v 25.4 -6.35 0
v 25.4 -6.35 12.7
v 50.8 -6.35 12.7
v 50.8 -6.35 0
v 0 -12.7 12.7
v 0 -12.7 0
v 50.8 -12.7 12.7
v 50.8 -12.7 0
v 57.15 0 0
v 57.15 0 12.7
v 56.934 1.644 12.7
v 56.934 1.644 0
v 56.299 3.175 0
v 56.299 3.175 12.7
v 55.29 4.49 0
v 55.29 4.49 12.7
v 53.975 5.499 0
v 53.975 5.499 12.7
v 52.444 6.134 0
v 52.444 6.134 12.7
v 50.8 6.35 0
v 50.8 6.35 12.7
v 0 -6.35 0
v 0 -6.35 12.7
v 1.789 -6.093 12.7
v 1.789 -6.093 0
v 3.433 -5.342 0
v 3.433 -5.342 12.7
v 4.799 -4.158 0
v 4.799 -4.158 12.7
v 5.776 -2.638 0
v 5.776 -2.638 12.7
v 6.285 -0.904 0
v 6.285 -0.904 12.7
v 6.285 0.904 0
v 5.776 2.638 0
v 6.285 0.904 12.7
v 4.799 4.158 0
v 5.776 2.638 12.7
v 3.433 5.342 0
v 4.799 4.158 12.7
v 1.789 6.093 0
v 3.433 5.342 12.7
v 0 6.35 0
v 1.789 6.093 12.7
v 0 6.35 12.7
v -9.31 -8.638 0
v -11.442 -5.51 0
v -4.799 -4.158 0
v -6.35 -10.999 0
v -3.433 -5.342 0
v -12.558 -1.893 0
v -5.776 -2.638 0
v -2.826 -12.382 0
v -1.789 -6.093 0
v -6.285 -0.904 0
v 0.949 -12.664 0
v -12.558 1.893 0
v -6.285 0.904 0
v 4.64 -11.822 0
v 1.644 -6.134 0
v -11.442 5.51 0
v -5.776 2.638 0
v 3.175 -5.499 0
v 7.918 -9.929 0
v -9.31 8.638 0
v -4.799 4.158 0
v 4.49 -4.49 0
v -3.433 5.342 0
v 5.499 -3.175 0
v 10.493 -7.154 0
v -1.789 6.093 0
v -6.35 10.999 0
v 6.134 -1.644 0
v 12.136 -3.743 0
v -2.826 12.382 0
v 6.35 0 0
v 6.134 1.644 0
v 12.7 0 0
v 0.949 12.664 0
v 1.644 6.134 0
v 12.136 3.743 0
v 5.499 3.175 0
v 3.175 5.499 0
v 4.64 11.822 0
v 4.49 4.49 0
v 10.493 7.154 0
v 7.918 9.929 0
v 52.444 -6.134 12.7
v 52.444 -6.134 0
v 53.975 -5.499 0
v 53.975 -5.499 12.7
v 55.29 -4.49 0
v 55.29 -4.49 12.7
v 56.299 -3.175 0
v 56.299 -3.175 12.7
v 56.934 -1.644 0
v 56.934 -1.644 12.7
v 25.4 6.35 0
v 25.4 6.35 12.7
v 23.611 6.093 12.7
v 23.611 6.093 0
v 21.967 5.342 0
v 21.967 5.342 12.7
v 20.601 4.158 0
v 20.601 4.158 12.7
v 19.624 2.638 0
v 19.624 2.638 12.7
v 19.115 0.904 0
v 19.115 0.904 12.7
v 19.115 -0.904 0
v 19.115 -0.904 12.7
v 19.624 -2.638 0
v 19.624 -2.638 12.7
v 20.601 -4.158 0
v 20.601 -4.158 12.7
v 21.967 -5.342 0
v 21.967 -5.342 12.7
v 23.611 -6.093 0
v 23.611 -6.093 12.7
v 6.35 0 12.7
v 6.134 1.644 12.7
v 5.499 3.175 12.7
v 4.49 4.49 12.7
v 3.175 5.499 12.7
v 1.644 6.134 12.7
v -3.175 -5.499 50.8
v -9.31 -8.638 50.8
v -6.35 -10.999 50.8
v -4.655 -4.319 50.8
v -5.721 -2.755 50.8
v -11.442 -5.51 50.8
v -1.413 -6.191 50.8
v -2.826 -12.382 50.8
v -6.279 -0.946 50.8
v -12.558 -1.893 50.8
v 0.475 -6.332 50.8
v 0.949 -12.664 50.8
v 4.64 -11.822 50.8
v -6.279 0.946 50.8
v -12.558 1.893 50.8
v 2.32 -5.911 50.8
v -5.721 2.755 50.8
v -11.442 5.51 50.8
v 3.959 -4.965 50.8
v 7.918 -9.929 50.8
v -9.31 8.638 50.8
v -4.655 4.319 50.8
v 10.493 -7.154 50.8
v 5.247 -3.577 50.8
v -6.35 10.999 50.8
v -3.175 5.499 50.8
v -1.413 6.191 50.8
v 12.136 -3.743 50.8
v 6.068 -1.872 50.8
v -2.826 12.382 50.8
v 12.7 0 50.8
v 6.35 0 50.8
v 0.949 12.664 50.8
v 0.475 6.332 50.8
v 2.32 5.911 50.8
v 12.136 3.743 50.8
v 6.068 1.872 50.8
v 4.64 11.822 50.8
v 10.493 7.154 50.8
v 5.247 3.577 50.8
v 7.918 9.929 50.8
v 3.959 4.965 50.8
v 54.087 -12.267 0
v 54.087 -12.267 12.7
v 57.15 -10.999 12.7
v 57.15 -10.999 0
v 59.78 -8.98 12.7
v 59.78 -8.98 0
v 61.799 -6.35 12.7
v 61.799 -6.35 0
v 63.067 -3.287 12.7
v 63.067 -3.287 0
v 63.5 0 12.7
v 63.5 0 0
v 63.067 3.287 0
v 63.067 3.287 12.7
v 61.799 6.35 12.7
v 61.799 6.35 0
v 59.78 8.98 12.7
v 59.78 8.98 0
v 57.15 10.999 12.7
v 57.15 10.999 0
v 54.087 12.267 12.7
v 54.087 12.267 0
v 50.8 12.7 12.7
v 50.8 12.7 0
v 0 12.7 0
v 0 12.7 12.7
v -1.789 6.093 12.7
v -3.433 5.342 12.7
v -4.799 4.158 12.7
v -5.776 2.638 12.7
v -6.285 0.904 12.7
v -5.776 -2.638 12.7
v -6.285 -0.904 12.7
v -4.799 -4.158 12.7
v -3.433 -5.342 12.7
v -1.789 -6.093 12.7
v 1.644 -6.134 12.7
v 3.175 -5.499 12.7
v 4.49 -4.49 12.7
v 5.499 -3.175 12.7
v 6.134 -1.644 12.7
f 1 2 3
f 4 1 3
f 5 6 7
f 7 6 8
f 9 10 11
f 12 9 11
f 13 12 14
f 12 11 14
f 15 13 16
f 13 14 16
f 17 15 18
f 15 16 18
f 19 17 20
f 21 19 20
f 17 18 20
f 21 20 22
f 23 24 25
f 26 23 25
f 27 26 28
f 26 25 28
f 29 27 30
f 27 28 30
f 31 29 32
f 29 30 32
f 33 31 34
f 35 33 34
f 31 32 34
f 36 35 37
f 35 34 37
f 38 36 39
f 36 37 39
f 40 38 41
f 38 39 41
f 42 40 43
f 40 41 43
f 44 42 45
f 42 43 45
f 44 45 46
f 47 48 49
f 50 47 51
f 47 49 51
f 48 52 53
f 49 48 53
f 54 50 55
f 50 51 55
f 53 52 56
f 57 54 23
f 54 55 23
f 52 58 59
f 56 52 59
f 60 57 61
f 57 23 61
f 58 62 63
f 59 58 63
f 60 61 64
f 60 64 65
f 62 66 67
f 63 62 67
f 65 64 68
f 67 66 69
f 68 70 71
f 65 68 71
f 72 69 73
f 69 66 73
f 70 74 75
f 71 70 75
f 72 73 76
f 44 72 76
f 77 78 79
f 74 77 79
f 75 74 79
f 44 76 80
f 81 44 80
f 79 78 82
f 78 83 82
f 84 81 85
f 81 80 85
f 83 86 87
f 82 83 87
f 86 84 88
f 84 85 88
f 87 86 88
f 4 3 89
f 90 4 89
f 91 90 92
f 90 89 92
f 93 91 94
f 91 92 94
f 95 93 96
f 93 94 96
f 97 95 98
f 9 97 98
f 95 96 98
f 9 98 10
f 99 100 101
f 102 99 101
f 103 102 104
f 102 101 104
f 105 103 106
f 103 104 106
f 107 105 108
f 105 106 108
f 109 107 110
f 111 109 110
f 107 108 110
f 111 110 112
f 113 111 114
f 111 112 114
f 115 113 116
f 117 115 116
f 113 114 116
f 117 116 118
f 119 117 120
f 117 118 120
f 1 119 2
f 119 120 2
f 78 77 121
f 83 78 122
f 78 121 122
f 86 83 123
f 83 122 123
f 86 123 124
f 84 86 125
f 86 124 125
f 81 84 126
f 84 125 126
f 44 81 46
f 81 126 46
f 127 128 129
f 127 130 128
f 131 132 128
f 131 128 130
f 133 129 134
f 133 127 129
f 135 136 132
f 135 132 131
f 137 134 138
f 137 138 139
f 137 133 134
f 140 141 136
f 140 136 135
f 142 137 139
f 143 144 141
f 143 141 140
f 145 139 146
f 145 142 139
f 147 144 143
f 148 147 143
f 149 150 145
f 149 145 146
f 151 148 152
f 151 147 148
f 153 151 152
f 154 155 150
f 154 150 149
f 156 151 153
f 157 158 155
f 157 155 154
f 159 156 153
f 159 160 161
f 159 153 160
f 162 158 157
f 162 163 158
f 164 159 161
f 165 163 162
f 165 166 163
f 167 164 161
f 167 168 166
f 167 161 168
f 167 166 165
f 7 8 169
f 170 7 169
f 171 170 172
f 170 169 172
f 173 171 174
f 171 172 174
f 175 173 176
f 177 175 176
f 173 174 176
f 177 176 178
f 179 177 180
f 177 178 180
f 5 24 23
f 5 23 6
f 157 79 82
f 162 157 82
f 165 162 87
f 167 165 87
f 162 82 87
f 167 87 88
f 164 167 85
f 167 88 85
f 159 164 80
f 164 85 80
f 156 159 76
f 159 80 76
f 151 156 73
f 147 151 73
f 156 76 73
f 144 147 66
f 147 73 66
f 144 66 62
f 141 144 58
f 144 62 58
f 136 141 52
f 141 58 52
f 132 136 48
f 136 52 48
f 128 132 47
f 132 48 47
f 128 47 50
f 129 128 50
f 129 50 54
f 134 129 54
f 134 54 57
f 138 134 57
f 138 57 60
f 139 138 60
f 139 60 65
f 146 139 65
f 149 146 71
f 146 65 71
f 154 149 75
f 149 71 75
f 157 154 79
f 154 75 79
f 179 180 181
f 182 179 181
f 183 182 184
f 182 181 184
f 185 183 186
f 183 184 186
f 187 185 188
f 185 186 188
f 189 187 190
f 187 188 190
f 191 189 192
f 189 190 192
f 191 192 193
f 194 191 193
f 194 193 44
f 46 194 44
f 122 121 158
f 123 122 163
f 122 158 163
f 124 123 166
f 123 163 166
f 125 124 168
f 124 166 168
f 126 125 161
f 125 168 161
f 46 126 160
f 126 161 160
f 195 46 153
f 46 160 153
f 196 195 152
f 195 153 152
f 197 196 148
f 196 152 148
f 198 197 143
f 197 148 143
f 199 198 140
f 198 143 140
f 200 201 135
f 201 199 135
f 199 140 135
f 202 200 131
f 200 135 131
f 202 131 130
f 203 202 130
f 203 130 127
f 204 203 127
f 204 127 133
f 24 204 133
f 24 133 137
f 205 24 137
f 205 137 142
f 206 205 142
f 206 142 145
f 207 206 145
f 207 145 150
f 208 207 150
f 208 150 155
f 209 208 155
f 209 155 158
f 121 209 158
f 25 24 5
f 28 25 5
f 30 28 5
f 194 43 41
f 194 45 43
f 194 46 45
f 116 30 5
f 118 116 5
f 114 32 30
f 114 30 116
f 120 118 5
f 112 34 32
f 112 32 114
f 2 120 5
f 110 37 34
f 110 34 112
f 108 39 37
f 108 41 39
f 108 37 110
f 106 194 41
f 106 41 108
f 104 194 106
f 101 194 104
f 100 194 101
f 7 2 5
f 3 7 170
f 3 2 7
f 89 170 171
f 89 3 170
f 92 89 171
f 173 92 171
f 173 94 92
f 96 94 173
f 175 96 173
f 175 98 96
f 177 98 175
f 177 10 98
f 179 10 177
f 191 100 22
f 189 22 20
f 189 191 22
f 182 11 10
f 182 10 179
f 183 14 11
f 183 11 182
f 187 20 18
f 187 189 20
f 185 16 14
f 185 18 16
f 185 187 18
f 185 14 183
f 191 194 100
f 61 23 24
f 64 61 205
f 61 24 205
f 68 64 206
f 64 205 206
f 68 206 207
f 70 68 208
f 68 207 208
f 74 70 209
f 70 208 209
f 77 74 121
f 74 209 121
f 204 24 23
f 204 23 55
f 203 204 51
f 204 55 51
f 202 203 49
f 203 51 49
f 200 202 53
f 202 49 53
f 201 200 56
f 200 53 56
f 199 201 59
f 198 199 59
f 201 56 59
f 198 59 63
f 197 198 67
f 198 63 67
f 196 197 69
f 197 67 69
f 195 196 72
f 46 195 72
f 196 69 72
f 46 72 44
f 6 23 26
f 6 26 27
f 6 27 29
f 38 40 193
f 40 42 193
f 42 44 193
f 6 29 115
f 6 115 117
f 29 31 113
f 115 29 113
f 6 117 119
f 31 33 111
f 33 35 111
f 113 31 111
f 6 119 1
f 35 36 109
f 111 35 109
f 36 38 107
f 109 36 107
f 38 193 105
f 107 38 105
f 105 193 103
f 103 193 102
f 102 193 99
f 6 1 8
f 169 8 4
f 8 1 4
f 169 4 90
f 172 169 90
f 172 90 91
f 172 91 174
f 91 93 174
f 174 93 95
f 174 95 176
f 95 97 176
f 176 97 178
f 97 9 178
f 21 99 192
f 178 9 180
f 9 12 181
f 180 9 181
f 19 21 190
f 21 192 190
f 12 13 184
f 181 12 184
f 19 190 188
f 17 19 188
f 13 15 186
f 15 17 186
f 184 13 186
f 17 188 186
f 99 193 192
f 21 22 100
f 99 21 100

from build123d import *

# Parameters (mm, degrees)
F0_R     = 12.7
F1_DEPTH = 50.8
F3_DEPTH = 12.7
F5_DEPTH = 12.7
F6_R     = 6.35
F7_DEPTH = 50.8
F9_DEPTH = 12.7


with BuildPart() as f1:
    # F0 (on Top) → F1 (new body)
    with BuildSketch(Plane.XY):
        Circle(F0_R)
    extrude(amount=F1_DEPTH)


with BuildPart() as f3:
    # F2 (on Top) → F3 (new body)
    with BuildSketch(Plane.XY):
        with BuildLine():
            Line((0, 12.7), (0, -12.7))
            Line((0, -12.7), (50.8, -12.7))
            ThreePointArc((50.8, -12.7), (38.1, 0), (50.8, 12.7))
            Line((50.8, 12.7), (0, 12.7))
        make_face()
        with BuildLine():
            Line((50.8, 12.7), (50.8, -12.7))
            ThreePointArc((50.8, -12.7), (59.7802561211, -8.9802561211), (63.5, 0))
            ThreePointArc((63.5, 0), (59.7802561211, 8.9802561211), (50.8, 12.7))
        make_face()
        with BuildLine():
            ThreePointArc((50.8, 12.7), (38.1, 0), (50.8, -12.7))
            Line((50.8, -12.7), (50.8, 12.7))
        make_face()
    extrude(amount=F3_DEPTH)

    # F4 (on face) → F5 (cut)
    with BuildSketch(Plane.XY.offset(12.7)):
        with BuildLine():
            ThreePointArc((57.15, 0), (55.2901280605, 4.4901280605), (50.8, 6.35))
            Line((50.8, 6.35), (50.8, -6.35))
            ThreePointArc((50.8, -6.35), (55.2901280605, -4.4901280605), (57.15, 0))
        make_face()
        with BuildLine():
            Line((50.8, -6.35), (50.8, 6.35))
            ThreePointArc((50.8, 6.35), (44.45, 0), (50.8, -6.35))
        make_face()
        with BuildLine():
            ThreePointArc((50.8, -6.35), (44.45, 0), (50.8, 6.35))
            Line((50.8, 6.35), (25.4, 6.35))
            ThreePointArc((25.4, 6.35), (29.8901280605, 4.4901280605), (31.75, 0))
            ThreePointArc((31.75, 0), (29.8901280605, -4.4901280605), (25.4, -6.35))
            Line((25.4, -6.35), (50.8, -6.35))
        make_face()
        with BuildLine():
            ThreePointArc((31.75, 0), (29.8901280605, 4.4901280605), (25.4, 6.35))
            Line((25.4, 6.35), (25.4, -6.35))
            ThreePointArc((25.4, -6.35), (29.8901280605, -4.4901280605), (31.75, 0))
        make_face()
        with BuildLine():
            Line((25.4, -6.35), (25.4, 6.35))
            ThreePointArc((25.4, 6.35), (19.05, 0), (25.4, -6.35))
        make_face()
    extrude(amount=-F5_DEPTH, mode=Mode.SUBTRACT)


with BuildPart() as f7_tool:
    # F6 (on face) → F7 (new body)
    with BuildSketch(Plane.XY.offset(50.8)):
        Circle(F6_R)
    extrude(amount=-F7_DEPTH)


with BuildPart() as f1_1:
    add(f1.part)

    # F7: cut by f7_tool
    add(f7_tool.part, mode=Mode.SUBTRACT)

    # F8 (on face) → F9 (cut)
    with BuildSketch(Plane(origin=(0, 0, 0), x_dir=(1, 0, 0), z_dir=(0, 0, -1))):
        with BuildLine():
            ThreePointArc((0, -6.35), (4.4901280605, -4.4901280605), (6.35, 0))
            ThreePointArc((6.35, 0), (4.4901280605, 4.4901280605), (0, 6.35))
            ThreePointArc((0, 6.35), (-6.35, 0), (0, -6.35))
        make_face()
    extrude(amount=-F9_DEPTH, mode=Mode.SUBTRACT)


with BuildPart() as f3_1:
    add(f3.part)

    # F7: cut by f7_tool
    add(f7_tool.part, mode=Mode.SUBTRACT)


solid = Compound([f1_1.part, f3_1.part])
